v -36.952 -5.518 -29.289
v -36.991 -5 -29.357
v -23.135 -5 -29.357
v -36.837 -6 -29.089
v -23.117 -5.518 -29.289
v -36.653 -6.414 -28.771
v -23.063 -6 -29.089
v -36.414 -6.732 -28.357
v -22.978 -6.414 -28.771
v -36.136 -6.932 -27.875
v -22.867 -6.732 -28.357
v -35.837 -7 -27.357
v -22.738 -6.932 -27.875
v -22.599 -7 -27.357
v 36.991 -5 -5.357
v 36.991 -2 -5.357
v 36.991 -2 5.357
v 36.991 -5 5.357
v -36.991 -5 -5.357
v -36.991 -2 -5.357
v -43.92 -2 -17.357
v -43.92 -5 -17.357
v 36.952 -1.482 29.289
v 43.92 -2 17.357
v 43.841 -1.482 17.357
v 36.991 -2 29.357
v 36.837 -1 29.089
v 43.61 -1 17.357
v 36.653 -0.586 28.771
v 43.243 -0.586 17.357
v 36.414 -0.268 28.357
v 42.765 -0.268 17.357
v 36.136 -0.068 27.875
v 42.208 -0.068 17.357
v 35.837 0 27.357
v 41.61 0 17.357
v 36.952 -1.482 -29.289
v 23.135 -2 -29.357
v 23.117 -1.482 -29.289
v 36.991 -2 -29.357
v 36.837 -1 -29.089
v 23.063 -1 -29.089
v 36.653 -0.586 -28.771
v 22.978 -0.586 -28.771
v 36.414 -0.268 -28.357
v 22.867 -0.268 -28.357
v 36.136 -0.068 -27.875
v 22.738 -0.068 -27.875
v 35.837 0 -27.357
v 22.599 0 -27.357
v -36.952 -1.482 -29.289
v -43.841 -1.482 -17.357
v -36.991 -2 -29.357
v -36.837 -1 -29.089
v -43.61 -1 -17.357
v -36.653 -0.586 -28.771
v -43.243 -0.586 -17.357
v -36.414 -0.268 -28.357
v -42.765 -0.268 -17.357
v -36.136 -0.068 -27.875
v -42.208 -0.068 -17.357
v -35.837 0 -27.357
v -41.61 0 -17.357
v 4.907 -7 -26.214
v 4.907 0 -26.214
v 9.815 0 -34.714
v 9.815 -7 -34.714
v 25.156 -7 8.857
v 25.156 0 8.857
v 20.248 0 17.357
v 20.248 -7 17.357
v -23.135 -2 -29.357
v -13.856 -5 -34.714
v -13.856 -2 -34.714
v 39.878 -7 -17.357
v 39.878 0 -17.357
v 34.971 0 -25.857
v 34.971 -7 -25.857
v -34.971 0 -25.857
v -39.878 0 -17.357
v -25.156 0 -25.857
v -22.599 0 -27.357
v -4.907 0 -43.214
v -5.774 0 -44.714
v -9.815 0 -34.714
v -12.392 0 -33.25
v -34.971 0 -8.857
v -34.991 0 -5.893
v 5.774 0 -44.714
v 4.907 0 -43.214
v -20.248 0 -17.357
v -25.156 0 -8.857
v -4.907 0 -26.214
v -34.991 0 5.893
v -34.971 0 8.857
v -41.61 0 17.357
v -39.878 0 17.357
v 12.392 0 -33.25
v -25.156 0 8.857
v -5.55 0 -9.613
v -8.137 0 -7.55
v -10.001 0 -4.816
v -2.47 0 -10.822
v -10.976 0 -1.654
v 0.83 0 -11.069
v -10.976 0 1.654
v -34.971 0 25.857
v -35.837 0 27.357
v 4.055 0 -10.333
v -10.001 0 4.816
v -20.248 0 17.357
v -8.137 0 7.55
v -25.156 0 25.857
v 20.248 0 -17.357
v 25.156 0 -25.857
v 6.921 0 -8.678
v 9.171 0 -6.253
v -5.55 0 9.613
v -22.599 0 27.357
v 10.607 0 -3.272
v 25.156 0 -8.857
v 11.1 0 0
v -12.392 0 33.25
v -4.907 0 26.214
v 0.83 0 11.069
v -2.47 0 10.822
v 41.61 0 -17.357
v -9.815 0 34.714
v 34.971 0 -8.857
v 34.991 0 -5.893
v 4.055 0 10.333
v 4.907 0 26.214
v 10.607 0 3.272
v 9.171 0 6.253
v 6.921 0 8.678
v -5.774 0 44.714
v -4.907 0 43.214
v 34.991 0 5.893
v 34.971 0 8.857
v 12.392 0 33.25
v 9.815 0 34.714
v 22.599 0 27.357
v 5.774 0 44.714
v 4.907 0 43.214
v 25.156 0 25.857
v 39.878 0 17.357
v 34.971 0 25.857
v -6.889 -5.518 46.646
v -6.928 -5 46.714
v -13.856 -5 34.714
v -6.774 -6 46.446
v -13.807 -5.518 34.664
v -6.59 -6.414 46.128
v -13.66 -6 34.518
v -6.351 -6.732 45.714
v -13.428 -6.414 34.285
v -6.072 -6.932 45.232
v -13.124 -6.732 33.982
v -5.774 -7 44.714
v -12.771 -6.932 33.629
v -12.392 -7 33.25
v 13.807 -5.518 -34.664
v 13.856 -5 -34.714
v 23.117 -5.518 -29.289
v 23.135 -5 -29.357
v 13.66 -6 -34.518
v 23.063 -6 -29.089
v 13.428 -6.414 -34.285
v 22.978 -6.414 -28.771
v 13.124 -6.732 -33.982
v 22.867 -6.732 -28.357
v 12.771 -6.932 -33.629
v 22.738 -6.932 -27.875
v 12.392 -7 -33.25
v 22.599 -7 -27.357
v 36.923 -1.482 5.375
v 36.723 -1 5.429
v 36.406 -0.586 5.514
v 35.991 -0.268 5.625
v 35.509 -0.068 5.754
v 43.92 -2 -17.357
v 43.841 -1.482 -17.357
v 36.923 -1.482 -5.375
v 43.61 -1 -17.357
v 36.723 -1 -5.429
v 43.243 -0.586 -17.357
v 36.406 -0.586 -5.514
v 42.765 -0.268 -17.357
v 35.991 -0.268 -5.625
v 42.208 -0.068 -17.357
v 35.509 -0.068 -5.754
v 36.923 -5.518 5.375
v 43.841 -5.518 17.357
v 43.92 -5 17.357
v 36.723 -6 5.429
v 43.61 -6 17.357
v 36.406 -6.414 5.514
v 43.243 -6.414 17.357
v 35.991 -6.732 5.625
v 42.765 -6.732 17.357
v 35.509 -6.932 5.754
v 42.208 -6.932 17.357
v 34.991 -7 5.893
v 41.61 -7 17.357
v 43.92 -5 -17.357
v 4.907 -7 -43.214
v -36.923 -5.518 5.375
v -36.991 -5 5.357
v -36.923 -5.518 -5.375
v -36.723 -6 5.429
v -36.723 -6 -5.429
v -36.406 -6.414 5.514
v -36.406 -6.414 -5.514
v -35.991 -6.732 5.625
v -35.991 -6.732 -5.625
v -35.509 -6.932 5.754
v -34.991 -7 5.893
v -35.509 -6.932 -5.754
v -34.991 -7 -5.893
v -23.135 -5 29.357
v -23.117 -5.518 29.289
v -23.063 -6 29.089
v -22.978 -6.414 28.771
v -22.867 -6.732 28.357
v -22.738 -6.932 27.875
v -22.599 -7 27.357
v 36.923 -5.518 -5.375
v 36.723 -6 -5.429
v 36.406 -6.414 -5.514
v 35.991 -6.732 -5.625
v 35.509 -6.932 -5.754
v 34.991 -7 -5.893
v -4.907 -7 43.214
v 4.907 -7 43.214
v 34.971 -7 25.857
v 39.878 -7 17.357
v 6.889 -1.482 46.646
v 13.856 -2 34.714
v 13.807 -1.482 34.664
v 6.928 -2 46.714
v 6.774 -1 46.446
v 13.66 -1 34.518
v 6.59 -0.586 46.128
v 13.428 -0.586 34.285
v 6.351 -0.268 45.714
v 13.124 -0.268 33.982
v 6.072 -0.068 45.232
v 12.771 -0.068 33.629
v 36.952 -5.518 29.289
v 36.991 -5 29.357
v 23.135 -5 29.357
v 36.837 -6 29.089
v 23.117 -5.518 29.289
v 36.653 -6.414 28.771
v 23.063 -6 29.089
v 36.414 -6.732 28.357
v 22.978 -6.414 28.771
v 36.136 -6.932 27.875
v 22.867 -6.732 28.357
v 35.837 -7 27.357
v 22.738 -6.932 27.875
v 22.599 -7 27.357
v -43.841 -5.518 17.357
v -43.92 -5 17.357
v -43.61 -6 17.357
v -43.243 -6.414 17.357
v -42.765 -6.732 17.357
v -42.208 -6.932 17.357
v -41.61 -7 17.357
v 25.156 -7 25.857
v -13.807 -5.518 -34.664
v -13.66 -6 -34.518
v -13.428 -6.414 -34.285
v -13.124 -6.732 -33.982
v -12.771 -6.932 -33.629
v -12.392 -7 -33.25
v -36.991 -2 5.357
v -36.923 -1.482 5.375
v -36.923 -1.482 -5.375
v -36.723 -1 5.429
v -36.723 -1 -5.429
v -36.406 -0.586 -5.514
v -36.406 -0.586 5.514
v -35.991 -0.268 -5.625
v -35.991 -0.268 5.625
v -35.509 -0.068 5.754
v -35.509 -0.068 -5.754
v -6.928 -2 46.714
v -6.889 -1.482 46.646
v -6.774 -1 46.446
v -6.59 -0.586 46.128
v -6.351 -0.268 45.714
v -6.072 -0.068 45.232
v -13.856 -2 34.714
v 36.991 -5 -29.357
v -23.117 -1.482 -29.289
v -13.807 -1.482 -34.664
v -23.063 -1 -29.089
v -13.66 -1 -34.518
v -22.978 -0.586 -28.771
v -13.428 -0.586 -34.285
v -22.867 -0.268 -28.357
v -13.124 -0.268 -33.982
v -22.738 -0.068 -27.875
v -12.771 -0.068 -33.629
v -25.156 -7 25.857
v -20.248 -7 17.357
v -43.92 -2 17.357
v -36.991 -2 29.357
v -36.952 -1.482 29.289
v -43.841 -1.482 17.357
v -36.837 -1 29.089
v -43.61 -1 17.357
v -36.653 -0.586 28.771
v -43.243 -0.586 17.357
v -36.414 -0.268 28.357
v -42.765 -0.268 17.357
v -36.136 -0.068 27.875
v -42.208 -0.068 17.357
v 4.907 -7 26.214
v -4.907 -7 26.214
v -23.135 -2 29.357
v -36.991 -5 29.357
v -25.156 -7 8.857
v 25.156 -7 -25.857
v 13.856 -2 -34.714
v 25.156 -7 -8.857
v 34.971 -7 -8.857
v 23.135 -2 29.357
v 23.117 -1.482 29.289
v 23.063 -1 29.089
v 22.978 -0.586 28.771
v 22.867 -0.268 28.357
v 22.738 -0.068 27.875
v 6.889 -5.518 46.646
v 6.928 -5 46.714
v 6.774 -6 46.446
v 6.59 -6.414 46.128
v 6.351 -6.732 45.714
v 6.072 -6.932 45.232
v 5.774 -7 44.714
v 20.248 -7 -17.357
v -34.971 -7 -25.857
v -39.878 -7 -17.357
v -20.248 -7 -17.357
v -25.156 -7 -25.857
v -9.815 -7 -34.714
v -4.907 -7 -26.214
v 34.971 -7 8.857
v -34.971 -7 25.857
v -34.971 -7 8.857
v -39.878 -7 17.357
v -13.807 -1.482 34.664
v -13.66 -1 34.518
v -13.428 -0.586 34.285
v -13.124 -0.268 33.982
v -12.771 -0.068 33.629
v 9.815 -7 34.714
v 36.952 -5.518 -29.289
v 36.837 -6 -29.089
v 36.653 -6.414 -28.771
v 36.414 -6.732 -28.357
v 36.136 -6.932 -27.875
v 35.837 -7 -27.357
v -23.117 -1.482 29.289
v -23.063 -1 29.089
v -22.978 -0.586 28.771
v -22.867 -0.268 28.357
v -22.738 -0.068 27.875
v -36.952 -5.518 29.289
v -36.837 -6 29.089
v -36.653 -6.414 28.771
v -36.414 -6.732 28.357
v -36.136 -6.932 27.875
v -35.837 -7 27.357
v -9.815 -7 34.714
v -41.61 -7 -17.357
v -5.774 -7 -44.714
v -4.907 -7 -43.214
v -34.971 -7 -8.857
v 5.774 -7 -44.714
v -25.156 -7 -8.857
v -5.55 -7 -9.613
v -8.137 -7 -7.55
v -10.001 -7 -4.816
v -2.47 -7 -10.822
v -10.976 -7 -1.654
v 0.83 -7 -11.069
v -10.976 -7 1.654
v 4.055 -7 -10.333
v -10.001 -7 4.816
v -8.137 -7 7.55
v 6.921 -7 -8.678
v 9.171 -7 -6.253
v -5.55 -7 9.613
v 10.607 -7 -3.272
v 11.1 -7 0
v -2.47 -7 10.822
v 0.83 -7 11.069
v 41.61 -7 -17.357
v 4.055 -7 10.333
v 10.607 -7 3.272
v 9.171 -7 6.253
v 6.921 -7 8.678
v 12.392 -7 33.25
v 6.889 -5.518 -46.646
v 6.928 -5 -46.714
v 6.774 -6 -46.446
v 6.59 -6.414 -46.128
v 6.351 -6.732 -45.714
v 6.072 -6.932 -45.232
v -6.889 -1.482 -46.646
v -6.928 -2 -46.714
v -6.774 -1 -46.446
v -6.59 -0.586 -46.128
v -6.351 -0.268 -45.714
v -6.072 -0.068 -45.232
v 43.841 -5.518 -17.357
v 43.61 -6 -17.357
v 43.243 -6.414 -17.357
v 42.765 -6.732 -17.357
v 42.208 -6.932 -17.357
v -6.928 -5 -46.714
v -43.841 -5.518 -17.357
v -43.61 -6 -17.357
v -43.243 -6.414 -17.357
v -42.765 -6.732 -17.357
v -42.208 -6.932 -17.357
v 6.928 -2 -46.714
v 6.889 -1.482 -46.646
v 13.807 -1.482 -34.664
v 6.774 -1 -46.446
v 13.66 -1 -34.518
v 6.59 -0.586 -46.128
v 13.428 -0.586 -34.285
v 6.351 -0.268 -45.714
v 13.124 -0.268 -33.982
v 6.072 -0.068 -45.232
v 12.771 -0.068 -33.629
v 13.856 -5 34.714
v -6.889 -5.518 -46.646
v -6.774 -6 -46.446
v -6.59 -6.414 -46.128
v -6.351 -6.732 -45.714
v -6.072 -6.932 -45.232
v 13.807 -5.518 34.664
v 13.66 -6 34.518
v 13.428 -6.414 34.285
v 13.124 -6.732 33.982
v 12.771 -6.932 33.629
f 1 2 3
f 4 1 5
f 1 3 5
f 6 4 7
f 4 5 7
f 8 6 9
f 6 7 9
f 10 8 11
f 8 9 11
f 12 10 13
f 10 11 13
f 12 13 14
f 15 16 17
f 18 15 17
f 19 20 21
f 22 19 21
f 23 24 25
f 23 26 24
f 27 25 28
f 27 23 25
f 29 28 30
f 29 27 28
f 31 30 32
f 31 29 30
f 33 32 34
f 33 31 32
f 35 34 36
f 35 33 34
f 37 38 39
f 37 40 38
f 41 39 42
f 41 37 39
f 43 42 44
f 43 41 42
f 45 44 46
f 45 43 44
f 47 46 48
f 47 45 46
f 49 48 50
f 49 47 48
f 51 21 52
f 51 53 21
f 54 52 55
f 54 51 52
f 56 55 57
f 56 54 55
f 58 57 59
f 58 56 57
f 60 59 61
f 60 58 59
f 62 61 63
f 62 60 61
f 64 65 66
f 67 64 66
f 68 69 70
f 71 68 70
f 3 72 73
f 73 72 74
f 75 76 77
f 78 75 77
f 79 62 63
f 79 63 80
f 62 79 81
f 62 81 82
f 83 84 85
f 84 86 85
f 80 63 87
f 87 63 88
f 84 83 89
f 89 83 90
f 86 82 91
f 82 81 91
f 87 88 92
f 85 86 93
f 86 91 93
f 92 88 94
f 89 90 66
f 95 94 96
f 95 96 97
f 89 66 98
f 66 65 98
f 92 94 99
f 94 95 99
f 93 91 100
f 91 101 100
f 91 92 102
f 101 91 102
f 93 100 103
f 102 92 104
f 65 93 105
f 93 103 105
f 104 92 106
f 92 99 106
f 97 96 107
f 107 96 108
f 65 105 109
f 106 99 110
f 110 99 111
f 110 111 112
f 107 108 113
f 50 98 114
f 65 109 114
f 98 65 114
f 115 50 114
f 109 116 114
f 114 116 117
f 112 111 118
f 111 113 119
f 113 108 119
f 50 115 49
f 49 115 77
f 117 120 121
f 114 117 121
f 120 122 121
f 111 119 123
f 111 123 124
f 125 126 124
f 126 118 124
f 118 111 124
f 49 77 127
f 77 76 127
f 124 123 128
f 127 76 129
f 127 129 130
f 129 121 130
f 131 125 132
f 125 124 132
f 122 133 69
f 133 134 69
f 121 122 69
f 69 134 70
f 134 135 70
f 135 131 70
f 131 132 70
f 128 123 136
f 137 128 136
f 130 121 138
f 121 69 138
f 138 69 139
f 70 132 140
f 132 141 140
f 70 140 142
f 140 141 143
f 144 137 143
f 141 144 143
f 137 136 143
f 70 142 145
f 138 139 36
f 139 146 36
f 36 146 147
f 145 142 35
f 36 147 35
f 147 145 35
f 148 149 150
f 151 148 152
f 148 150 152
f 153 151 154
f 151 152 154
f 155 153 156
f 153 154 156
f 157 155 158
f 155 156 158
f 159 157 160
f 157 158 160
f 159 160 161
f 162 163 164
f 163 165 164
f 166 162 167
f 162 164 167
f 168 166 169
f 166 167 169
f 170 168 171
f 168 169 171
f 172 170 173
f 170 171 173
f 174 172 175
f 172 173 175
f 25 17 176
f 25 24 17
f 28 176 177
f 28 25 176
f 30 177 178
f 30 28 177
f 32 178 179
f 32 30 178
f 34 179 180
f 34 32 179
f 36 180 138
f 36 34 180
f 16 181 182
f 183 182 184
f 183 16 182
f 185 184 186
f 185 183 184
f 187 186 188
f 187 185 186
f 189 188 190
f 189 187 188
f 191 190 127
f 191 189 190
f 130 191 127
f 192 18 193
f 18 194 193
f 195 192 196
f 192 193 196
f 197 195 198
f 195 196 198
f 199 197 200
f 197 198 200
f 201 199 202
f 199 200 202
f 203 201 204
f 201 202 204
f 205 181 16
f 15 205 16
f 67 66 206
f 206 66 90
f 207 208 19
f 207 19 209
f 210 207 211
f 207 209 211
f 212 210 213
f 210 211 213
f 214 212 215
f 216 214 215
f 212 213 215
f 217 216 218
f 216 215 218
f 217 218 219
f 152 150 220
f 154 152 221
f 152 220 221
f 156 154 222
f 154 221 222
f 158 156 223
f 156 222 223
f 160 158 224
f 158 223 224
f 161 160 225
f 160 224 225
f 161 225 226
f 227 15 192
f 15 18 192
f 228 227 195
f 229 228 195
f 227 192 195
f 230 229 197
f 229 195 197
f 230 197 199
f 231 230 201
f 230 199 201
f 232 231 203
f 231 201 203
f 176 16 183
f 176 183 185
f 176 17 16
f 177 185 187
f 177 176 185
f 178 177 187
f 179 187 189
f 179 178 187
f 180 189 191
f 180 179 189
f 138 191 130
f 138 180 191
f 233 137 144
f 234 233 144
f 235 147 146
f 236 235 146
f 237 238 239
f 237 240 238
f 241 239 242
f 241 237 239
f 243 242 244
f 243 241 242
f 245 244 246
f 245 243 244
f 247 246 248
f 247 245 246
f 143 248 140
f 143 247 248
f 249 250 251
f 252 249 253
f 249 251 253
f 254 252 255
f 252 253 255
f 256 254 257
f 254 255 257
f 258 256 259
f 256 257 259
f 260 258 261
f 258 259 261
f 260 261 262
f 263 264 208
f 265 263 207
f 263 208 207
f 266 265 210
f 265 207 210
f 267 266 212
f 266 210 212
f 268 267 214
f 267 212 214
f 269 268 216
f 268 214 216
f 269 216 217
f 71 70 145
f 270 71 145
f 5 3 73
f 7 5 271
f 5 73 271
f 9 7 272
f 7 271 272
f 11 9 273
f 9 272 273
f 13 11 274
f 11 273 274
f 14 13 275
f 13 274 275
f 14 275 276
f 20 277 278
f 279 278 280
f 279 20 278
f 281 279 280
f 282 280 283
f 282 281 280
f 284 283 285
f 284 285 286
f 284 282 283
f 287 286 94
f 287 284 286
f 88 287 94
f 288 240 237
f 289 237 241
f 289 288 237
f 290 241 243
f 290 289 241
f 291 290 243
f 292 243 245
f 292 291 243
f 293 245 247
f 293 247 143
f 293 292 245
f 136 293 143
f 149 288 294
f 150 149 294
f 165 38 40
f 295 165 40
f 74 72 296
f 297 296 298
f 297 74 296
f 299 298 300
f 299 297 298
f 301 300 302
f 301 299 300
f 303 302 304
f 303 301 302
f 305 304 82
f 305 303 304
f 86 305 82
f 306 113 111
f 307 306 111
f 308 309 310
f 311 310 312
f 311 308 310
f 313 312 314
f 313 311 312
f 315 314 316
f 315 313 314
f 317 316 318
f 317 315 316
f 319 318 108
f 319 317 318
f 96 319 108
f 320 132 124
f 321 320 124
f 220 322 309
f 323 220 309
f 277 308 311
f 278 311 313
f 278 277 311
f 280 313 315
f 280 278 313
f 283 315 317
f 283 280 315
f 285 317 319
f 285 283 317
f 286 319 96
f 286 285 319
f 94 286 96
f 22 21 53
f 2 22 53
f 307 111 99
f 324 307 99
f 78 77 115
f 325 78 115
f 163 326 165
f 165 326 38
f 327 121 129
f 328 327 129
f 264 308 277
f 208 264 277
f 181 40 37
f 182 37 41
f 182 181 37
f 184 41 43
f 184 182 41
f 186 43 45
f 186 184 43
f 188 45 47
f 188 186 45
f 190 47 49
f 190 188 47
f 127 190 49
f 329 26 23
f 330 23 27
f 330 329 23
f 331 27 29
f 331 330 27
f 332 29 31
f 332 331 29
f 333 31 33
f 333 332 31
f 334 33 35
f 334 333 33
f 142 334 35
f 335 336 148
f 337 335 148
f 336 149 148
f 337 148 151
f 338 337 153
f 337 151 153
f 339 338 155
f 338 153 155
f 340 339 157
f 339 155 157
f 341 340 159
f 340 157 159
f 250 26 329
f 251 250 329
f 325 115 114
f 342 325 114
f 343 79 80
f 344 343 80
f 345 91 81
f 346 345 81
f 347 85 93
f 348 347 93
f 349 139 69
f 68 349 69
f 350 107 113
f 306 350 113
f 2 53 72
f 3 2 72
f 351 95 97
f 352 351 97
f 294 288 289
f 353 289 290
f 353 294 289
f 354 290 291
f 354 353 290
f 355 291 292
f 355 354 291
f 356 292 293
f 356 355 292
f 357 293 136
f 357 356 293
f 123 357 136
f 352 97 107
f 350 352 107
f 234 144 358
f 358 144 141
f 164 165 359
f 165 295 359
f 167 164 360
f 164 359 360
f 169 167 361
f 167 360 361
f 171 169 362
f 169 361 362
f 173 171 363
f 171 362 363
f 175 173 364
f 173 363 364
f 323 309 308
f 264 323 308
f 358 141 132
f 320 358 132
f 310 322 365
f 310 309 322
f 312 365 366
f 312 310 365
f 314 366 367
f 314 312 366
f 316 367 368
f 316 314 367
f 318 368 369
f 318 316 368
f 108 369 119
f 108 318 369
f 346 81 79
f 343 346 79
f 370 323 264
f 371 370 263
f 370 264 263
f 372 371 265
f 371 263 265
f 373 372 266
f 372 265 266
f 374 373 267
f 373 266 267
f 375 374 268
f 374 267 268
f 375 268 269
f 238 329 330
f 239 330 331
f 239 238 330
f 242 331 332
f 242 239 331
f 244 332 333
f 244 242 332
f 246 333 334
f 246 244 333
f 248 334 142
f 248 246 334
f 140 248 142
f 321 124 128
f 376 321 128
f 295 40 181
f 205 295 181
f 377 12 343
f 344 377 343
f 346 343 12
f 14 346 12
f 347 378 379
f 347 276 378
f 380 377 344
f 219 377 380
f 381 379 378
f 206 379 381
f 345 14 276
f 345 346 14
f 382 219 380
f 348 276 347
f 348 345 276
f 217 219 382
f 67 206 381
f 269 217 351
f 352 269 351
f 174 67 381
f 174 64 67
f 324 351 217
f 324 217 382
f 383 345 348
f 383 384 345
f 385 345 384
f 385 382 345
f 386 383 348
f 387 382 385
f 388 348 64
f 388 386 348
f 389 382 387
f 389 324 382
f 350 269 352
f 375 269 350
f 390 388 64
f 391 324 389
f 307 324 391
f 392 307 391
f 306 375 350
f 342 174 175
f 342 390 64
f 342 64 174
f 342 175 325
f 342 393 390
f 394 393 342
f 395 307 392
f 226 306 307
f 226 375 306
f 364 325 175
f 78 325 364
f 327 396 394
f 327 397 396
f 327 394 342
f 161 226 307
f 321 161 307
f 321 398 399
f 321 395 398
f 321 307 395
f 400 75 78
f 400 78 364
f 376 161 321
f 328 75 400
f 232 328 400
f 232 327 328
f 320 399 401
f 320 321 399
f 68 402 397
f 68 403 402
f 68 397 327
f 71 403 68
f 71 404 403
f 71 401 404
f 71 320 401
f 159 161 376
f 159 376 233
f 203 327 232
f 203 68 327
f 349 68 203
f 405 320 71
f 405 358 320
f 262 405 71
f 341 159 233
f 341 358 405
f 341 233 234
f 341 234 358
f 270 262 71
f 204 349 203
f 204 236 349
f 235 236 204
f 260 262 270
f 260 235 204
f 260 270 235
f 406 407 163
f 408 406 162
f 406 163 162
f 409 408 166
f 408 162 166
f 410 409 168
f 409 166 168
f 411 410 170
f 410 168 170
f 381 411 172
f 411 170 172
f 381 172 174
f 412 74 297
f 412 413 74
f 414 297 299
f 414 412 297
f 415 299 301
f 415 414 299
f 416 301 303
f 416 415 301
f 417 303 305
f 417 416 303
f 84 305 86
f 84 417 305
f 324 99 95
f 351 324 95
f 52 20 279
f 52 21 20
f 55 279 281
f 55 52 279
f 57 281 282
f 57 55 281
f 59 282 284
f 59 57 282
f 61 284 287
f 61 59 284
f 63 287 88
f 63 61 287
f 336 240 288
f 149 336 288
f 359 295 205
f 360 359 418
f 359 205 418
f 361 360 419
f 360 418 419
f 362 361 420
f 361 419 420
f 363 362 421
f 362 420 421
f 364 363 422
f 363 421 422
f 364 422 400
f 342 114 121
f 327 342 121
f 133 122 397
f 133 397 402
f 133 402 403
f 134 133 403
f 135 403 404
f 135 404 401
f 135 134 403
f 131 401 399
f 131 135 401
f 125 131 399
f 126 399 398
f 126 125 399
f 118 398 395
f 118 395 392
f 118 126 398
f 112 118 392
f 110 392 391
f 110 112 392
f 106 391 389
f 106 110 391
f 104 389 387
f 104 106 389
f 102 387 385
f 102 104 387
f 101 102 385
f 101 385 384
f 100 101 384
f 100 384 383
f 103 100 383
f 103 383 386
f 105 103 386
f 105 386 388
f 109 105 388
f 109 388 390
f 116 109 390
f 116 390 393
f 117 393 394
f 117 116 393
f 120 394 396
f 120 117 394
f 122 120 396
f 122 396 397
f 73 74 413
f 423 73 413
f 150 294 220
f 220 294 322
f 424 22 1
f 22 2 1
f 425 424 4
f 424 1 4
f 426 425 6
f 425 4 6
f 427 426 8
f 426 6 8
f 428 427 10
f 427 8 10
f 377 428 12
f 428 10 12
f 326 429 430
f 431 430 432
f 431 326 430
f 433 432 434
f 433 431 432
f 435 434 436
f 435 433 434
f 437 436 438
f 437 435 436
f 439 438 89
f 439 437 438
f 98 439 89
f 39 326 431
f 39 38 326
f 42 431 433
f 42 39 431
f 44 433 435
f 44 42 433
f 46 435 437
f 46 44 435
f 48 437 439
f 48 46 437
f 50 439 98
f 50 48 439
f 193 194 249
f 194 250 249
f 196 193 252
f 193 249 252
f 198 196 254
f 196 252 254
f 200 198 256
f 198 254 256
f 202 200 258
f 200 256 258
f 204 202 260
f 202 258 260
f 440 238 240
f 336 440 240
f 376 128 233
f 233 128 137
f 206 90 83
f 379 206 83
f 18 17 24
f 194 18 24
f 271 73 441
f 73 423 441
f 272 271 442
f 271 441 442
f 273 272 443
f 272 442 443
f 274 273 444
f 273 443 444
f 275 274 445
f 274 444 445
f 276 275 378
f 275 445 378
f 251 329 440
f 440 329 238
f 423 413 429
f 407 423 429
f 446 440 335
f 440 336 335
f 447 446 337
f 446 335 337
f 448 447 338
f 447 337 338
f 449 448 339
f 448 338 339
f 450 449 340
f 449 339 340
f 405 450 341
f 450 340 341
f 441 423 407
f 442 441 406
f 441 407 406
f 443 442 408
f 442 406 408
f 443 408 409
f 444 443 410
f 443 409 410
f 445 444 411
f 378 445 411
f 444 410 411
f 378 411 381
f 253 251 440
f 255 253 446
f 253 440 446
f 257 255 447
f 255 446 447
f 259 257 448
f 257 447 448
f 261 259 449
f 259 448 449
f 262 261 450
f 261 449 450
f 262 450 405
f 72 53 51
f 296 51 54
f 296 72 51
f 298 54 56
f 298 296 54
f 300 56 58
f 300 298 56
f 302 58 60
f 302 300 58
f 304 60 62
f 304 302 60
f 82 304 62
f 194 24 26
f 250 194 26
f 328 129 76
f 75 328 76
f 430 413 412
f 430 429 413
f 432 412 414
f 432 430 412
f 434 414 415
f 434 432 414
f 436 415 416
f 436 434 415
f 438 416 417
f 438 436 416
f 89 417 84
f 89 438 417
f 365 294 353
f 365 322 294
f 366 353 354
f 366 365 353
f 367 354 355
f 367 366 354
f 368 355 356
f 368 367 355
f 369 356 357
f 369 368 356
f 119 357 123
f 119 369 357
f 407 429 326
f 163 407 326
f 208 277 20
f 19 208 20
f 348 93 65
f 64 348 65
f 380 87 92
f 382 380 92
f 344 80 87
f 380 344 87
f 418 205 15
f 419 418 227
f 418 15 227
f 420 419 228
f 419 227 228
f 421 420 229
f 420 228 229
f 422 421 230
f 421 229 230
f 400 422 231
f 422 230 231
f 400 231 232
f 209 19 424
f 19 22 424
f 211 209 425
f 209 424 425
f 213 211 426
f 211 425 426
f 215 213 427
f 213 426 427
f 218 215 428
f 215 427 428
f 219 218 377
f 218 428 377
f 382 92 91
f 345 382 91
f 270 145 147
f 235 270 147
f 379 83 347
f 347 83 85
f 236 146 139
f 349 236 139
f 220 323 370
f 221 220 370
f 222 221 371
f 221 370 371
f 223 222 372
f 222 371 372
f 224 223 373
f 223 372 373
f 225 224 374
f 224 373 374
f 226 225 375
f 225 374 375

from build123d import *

# Parameters (mm, degrees)
F0_R     = 14.5
F0_R_2   = 11.1
F1_DEPTH = 7
F2_R     = 2


with BuildPart() as f1:
    # F0 (on Front) → F1 (new body)
    with BuildSketch(Plane.XZ):
        Polygon((-16.206814, 17.357009), (-23.135017, 29.357009), (-36.991424, 29.357009), (-43.919627, 17.357009), (-36.991424, 5.357009), (-23.135017, 5.357009), align=None)
        Polygon((-34.970698, 25.857009), (-25.155743, 25.857009), (-20.248266, 17.357009), (-25.155743, 8.857009), (-34.970698, 8.857009), (-39.878175, 17.357009), align=None, mode=Mode.SUBTRACT)
        Polygon((-6.928203, 22.714017), (6.928203, 22.714017), (13.856406, 34.714017), (6.928203, 46.714017), (-6.928203, 46.714017), (-13.856406, 34.714017), align=None)
        Polygon((9.814955, 34.714017), (4.907477, 26.214017), (-4.907477, 26.214017), (-9.814955, 34.714017), (-4.907477, 43.214017), (4.907477, 43.214017), align=None, mode=Mode.SUBTRACT)
        Polygon((13.856406, 34.714017), (6.928203, 22.714017), (-6.928203, 22.714017), (-13.856406, 34.714017), (-23.135017, 29.357009), (-16.206814, 17.357009), (-23.135017, 5.357009), (-36.991424, 5.357009), (-36.991424, -5.357009), (-23.135017, -5.357009), (-16.206814, -17.357009), (-23.135017, -29.357009), (-13.856406, -34.714017), (-6.928203, -22.714017), (6.928203, -22.714017), (13.856406, -34.714017), (23.135017, -29.357009), (16.206814, -17.357009), (23.135017, -5.357009), (36.991424, -5.357009), (36.991424, 5.357009), (23.135017, 5.357009), (16.206814, 17.357009), (23.135017, 29.357009), align=None)
        Circle(F0_R, mode=Mode.SUBTRACT)
        Circle(F0_R)
        Circle(F0_R_2, mode=Mode.SUBTRACT)
        Polygon((-23.135017, -5.357009), (-36.991424, -5.357009), (-43.919627, -17.357009), (-36.991424, -29.357009), (-23.135017, -29.357009), (-16.206814, -17.357009), align=None)
        Polygon((-39.878175, -17.357009), (-34.970698, -8.857009), (-25.155743, -8.857009), (-20.248266, -17.357009), (-25.155743, -25.857009), (-34.970698, -25.857009), align=None, mode=Mode.SUBTRACT)
        Polygon((6.928203, -46.714017), (13.856406, -34.714017), (6.928203, -22.714017), (-6.928203, -22.714017), (-13.856406, -34.714017), (-6.928203, -46.714017), align=None)
        Polygon((-4.907477, -43.214017), (-9.814955, -34.714017), (-4.907477, -26.214017), (4.907477, -26.214017), (9.814955, -34.714017), (4.907477, -43.214017), align=None, mode=Mode.SUBTRACT)
        Polygon((43.919627, -17.357009), (36.991424, -5.357009), (23.135017, -5.357009), (16.206814, -17.357009), (23.135017, -29.357009), (36.991424, -29.357009), align=None)
        Polygon((34.970698, -25.857009), (25.155743, -25.857009), (20.248266, -17.357009), (25.155743, -8.857009), (34.970698, -8.857009), (39.878175, -17.357009), align=None, mode=Mode.SUBTRACT)
        Polygon((36.991424, 29.357009), (23.135017, 29.357009), (16.206814, 17.357009), (23.135017, 5.357009), (36.991424, 5.357009), (43.919627, 17.357009), align=None)
        Polygon((39.878175, 17.357009), (34.970698, 8.857009), (25.155743, 8.857009), (20.248266, 17.357009), (25.155743, 25.857009), (34.970698, 25.857009), align=None, mode=Mode.SUBTRACT)
    extrude(amount=F1_DEPTH)

    # F2
    f2_edges = [f1.edges().sort_by_distance(p)[0] for p in [
        (0, -7, 46.714017),
        (10.392305, -7, 40.714017),
        (18.495712, -7, 32.035513),
        (30.063221, -7, 29.357009),
        (40.455525, -7, 23.357009),
        (40.455525, -7, 11.357009),
        (36.991424, -7, 0),
        (40.455525, -7, -11.357009),
        (40.455525, -7, -23.357009),
        (-10.392305, -7, 40.714017),
        (-18.495712, -7, 32.035513),
        (-30.063221, -7, 29.357009),
        (-40.455525, -7, 23.357009),
        (-40.455525, -7, 11.357009),
        (-36.991424, -7, 0),
        (-40.455525, -7, -11.357009),
        (-40.455525, -7, -23.357009),
        (-18.495712, -7, -32.035513),
        (-10.392305, -7, -40.714017),
        (0, -7, -46.714017),
        (10.392305, -7, -40.714017),
        (18.495712, -7, -32.035513),
        (30.063221, -7, -29.357009),
        (-30.063221, -7, -29.357009),
        (0, 0, -46.714017),
        (10.392305, 0, -40.714017),
        (18.495712, 0, -32.035513),
        (30.063221, 0, -29.357009),
        (40.455525, 0, -23.357009),
        (40.455525, 0, -11.357009),
        (36.991424, 0, 0),
        (40.455525, 0, 11.357009),
        (40.455525, 0, 23.357009),
        (30.063221, 0, 29.357009),
        (18.495712, 0, 32.035513),
        (10.392305, 0, 40.714017),
        (0, 0, 46.714017),
        (-10.392305, 0, 40.714017),
        (-18.495712, 0, 32.035513),
        (-30.063221, 0, 29.357009),
        (-40.455525, 0, 23.357009),
        (-40.455525, 0, 11.357009),
        (-36.991424, 0, 0),
        (-40.455525, 0, -11.357009),
        (-40.455525, 0, -23.357009),
        (-30.063221, 0, -29.357009),
        (-18.495712, 0, -32.035513),
        (-10.392305, 0, -40.714017),
    ]]
    fillet(f2_edges, radius=F2_R)


solid = f1.part
